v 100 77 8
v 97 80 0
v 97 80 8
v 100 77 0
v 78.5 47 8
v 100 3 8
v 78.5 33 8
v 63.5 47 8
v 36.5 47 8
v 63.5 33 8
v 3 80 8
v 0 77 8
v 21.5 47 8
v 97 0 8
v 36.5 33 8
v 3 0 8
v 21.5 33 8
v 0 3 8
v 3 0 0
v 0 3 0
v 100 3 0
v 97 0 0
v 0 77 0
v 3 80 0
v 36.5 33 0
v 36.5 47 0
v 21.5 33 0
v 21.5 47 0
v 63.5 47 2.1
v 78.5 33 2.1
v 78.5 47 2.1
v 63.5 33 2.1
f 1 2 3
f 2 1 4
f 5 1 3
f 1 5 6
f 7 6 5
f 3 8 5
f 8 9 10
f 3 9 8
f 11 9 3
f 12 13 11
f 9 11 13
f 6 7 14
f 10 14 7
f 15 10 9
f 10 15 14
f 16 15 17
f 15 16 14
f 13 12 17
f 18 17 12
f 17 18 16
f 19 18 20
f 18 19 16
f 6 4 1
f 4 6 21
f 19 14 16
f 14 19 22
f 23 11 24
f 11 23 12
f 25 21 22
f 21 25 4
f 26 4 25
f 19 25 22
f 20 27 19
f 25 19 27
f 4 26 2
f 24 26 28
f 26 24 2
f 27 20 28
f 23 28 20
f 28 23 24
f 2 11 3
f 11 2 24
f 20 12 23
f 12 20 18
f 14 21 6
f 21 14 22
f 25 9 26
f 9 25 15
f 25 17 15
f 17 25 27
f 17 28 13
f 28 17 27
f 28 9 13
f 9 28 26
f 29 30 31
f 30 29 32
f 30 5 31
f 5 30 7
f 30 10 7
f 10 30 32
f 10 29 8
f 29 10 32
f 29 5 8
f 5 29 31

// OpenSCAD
$fn = 32;

// ----------------------------------------------------------------------
// Windowed plate: 2 voids, 100 x 80 x 8 mm
// ----------------------------------------------------------------------

// --- parameters (mm) ---
plate_l = 100;            // plate length, X
plate_w = 80;             // plate width, Y
plate_t = 8;              // plate thickness, Z
edge_margin = 8;          // wall from the plate edge to any window
windows = 2;              // number of windows in the row
win_l = 15;               // window length
win_w = 14;               // window width
win_pitch = 42;           // window pitch along X
depth_1 = 8;              // depth of void 1 (full thickness = through)
depth_2 = 5.9;            // depth of void 2 (full thickness = through)
corner_c = 3;             // corner chamfer of the plate

profile = [[3, 0], [97, 0], [100, 3], [100, 77], [97, 80], [3, 80], [0, 77], [0, 3]];  // primary outline, 8 points, counter clockwise
void_1 = [[21.5, 33], [36.5, 33], [36.5, 47], [21.5, 47]];  // window 1 of the row, 4 points
void_2 = [[63.5, 33], [78.5, 33], [78.5, 47], [63.5, 47]];  // window 2 of the row, 4 points

// --- the one profile operation ---
difference() {
  linear_extrude(height = plate_t) polygon(points = profile);
  translate([0, 0, -1])
    linear_extrude(height = plate_t + 2) polygon(points = void_1);
  translate([0, 0, plate_t - depth_2])
    linear_extrude(height = depth_2 + 1) polygon(points = void_2);
}
